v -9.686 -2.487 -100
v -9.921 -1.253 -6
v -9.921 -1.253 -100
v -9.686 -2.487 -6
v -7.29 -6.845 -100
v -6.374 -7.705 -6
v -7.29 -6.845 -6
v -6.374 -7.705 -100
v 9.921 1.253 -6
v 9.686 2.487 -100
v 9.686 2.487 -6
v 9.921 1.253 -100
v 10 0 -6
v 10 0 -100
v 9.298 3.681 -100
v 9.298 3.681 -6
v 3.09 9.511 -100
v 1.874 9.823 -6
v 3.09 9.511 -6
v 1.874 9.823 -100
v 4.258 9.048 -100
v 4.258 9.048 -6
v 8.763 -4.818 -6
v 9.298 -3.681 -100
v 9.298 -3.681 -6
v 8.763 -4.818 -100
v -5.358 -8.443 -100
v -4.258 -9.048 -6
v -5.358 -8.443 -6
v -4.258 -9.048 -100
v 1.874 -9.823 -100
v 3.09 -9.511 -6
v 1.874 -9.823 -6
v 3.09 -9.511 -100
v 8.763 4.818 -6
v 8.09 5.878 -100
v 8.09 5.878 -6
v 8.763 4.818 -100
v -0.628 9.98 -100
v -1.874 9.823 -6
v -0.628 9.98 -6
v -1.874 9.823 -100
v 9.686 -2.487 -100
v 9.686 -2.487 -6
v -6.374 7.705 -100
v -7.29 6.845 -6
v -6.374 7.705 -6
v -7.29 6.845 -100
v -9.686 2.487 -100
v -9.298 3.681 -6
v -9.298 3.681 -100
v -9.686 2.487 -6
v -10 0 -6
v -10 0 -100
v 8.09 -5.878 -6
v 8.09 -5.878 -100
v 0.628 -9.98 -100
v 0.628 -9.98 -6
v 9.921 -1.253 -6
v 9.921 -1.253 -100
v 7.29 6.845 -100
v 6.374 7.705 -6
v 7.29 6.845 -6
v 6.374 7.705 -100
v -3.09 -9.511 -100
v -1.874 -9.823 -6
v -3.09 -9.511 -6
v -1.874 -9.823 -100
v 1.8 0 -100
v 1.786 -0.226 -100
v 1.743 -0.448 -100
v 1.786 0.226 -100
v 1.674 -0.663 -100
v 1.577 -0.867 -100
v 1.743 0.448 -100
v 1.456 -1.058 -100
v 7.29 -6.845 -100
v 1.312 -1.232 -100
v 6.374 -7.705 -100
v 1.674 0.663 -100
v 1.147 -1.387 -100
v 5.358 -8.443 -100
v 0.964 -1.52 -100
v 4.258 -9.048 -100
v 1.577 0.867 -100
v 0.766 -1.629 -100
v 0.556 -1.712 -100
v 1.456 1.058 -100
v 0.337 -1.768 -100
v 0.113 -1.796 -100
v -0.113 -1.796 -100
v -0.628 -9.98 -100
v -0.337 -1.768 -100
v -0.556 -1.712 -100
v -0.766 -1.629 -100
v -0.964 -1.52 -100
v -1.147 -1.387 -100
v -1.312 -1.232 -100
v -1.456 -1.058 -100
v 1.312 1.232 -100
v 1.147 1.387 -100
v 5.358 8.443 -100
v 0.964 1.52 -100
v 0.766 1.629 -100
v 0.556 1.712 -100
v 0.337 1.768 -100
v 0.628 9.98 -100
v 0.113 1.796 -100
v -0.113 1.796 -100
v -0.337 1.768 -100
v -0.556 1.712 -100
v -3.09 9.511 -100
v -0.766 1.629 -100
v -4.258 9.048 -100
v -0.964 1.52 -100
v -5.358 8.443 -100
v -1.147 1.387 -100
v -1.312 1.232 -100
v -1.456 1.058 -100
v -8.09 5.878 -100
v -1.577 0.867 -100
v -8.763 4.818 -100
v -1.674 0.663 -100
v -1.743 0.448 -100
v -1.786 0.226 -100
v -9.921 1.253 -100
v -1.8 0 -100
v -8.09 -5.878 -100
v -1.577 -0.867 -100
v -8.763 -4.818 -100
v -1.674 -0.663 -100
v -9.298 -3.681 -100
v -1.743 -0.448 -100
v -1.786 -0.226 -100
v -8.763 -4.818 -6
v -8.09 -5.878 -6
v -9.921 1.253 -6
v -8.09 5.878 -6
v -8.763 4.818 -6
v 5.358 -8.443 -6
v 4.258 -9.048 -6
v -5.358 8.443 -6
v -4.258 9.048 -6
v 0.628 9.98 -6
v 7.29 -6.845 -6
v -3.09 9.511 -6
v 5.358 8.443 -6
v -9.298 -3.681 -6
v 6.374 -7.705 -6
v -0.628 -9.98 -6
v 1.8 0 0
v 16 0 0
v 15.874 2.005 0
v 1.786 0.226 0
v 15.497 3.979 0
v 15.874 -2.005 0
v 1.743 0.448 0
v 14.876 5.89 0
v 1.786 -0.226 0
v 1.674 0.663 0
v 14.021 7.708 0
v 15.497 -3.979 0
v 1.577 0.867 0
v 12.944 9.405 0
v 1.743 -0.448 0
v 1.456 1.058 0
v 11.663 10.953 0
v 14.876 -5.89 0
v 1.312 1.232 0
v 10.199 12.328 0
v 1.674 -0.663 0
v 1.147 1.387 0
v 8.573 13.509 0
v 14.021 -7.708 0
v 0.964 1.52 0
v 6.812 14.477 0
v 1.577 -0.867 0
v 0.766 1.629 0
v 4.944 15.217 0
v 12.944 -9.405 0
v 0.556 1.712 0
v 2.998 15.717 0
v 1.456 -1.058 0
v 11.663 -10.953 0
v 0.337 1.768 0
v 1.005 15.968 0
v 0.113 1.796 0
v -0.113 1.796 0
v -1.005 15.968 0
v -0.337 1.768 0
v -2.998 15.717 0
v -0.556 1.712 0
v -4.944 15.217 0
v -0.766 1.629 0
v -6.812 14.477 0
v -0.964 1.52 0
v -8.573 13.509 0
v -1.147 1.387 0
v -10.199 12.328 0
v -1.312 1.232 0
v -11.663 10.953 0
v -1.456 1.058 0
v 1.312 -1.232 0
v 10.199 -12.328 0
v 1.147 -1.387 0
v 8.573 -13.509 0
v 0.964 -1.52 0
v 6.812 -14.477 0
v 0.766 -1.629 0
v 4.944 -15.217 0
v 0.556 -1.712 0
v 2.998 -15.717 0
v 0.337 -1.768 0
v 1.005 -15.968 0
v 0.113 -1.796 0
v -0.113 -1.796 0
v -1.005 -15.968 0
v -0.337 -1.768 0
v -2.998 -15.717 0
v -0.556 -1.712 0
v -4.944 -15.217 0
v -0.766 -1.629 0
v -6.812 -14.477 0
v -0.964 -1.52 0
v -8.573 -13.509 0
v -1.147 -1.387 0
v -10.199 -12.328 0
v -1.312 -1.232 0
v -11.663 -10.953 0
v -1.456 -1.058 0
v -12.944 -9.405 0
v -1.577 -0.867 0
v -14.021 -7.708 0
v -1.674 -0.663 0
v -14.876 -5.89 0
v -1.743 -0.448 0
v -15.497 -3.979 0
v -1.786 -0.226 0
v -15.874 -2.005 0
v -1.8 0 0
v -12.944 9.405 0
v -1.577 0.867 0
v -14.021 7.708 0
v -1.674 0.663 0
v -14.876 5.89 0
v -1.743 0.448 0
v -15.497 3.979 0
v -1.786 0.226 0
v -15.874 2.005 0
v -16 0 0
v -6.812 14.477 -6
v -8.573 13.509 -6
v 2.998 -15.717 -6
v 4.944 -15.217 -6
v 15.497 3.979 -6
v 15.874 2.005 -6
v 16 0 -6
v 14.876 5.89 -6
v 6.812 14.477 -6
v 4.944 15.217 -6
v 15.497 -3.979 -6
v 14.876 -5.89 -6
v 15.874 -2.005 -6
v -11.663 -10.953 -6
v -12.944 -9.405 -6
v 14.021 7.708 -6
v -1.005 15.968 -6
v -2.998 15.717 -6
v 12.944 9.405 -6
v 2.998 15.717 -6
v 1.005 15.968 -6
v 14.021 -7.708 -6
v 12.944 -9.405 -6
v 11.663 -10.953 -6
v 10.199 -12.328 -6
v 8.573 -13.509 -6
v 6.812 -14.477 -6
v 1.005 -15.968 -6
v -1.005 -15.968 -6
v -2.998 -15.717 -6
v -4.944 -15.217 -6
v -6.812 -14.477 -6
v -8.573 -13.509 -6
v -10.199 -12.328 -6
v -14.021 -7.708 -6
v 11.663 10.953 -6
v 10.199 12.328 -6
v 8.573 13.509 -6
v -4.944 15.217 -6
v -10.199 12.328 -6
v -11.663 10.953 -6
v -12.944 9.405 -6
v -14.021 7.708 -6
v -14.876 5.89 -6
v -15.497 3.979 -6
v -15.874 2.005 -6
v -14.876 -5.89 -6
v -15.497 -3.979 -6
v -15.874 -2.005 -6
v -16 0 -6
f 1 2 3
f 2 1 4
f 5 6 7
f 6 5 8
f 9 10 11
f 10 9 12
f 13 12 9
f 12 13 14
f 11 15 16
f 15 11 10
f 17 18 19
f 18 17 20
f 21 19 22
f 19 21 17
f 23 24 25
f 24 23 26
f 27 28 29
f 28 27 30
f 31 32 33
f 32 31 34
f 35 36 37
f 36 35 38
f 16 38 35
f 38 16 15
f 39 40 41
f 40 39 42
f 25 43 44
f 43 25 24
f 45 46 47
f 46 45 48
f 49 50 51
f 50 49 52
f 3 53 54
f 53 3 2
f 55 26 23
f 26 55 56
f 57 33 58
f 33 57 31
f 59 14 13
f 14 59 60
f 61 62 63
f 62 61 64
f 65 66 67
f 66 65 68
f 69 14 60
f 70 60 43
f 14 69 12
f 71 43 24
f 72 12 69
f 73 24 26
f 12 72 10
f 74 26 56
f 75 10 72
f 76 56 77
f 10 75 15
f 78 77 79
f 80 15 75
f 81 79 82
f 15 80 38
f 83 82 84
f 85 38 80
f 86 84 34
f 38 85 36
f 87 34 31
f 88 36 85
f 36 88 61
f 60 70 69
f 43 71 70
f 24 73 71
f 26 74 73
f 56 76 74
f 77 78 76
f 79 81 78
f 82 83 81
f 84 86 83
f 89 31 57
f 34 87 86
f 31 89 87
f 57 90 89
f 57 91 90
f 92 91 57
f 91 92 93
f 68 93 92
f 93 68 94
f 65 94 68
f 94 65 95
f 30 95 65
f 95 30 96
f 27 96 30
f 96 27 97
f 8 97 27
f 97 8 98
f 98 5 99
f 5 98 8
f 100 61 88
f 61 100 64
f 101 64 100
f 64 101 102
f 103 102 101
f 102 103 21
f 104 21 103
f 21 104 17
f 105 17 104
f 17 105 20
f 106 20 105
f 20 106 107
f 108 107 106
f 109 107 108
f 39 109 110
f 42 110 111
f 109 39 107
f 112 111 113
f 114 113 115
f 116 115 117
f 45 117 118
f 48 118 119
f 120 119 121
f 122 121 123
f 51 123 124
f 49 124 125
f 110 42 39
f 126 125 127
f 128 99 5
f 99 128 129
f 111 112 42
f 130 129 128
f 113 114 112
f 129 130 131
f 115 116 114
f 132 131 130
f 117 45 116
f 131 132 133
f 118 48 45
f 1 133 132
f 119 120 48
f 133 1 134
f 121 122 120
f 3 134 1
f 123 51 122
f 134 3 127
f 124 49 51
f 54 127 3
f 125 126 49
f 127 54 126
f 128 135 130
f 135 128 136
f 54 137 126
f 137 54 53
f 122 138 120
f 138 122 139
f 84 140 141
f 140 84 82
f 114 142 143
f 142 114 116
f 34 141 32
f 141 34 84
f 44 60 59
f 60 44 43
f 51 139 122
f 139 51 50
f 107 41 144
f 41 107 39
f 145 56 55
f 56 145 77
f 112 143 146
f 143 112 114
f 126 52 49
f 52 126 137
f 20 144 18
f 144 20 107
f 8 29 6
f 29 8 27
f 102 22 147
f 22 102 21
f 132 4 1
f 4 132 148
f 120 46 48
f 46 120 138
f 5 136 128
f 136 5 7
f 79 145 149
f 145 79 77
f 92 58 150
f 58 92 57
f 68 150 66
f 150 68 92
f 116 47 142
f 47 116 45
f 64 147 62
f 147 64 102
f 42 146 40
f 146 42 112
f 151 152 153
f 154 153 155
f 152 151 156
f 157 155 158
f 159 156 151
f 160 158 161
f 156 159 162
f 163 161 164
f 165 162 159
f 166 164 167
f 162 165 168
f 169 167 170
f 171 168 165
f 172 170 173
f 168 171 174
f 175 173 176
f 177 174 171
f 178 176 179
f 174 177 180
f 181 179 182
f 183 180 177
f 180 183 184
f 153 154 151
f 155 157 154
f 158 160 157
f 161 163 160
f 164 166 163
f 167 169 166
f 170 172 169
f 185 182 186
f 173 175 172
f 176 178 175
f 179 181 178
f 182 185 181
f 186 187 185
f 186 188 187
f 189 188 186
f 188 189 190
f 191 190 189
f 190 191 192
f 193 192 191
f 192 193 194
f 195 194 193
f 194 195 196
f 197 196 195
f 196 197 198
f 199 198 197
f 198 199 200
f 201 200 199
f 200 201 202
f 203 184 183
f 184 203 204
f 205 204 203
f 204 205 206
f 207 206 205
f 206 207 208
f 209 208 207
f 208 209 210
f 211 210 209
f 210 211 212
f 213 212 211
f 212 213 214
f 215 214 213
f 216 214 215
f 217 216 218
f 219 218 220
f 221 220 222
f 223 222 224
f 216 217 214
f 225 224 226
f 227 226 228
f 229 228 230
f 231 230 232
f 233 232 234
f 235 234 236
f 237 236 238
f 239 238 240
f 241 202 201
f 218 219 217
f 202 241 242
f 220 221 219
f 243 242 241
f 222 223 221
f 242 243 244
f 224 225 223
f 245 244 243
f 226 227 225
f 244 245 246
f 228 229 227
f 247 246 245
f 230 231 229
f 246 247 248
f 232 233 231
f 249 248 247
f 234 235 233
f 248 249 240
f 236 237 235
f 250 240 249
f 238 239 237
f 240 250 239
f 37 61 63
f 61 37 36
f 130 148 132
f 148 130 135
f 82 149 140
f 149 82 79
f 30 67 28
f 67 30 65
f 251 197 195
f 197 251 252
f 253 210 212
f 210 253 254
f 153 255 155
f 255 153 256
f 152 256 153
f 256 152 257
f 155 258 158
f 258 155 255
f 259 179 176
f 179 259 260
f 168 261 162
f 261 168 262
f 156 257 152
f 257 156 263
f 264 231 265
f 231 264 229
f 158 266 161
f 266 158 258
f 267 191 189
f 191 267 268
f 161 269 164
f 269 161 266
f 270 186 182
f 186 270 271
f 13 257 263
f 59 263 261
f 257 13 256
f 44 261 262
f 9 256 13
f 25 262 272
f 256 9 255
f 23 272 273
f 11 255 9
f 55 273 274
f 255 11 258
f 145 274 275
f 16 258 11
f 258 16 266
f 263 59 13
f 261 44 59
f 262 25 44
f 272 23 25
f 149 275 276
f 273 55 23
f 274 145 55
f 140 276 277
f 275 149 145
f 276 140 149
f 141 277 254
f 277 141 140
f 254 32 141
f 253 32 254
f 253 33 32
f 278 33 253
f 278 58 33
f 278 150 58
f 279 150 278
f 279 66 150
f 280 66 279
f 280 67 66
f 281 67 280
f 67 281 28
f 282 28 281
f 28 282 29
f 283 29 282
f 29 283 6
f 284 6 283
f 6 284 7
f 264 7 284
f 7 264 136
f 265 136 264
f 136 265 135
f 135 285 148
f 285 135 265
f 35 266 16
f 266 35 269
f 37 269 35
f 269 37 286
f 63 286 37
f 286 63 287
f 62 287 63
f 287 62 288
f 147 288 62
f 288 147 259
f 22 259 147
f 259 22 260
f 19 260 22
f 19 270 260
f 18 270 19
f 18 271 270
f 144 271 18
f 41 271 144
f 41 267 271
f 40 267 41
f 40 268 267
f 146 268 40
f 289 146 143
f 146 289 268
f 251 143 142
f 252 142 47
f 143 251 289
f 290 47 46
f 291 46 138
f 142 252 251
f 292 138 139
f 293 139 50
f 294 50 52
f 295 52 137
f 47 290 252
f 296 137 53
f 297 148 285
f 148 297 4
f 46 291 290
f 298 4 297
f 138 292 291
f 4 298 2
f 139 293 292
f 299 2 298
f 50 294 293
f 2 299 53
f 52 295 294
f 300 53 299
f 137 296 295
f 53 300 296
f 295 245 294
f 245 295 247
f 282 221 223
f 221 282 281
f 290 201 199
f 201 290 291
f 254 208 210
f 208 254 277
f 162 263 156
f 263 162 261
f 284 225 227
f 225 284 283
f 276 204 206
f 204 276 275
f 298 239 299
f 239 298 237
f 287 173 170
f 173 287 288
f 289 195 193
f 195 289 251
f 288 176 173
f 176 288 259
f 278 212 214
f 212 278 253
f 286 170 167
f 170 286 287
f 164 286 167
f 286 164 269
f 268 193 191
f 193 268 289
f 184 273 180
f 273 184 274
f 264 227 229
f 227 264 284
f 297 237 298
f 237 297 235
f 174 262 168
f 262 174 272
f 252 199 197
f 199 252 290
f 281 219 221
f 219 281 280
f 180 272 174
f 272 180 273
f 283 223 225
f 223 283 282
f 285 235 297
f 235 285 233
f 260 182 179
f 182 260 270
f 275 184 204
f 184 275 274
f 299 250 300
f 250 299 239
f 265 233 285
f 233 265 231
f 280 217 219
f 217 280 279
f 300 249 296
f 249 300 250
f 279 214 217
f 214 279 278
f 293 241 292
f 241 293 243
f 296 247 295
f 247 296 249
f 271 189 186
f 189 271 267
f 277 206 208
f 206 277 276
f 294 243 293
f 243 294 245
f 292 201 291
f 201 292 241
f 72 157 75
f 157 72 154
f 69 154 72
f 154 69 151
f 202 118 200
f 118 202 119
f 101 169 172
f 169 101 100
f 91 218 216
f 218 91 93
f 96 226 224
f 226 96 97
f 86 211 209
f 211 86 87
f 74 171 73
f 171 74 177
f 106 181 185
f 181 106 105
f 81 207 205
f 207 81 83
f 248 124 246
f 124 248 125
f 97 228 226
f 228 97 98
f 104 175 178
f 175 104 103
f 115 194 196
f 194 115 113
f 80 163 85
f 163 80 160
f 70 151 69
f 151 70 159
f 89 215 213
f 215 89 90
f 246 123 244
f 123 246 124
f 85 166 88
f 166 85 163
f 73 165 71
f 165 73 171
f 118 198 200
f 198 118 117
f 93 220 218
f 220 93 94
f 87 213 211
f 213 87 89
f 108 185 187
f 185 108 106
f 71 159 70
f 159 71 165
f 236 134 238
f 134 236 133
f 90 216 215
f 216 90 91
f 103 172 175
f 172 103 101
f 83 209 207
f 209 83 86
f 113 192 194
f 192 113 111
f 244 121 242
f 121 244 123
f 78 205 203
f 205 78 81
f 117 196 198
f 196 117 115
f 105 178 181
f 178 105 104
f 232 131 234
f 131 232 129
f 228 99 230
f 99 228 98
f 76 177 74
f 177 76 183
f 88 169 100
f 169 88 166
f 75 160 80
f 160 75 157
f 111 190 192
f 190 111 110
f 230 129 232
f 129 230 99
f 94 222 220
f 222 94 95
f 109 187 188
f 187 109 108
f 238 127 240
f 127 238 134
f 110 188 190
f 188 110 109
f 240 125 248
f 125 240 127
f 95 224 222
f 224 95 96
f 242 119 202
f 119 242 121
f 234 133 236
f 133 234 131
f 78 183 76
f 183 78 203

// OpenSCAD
$fn = 50;


difference() {
	union() {
		translate(v = [0, 0, -100.0000000000]) {
			cylinder(h = 100, r = 10.0000000000);
		}
		translate(v = [0, 0, -6.0000000000]) {
			cylinder(h = 6, r = 16.0000000000);
		}
	}
	union() {
		#translate(v = [0, 0, -100]) {
			cylinder(h = 100, r = 1.8000000000);
		}
	}
}
